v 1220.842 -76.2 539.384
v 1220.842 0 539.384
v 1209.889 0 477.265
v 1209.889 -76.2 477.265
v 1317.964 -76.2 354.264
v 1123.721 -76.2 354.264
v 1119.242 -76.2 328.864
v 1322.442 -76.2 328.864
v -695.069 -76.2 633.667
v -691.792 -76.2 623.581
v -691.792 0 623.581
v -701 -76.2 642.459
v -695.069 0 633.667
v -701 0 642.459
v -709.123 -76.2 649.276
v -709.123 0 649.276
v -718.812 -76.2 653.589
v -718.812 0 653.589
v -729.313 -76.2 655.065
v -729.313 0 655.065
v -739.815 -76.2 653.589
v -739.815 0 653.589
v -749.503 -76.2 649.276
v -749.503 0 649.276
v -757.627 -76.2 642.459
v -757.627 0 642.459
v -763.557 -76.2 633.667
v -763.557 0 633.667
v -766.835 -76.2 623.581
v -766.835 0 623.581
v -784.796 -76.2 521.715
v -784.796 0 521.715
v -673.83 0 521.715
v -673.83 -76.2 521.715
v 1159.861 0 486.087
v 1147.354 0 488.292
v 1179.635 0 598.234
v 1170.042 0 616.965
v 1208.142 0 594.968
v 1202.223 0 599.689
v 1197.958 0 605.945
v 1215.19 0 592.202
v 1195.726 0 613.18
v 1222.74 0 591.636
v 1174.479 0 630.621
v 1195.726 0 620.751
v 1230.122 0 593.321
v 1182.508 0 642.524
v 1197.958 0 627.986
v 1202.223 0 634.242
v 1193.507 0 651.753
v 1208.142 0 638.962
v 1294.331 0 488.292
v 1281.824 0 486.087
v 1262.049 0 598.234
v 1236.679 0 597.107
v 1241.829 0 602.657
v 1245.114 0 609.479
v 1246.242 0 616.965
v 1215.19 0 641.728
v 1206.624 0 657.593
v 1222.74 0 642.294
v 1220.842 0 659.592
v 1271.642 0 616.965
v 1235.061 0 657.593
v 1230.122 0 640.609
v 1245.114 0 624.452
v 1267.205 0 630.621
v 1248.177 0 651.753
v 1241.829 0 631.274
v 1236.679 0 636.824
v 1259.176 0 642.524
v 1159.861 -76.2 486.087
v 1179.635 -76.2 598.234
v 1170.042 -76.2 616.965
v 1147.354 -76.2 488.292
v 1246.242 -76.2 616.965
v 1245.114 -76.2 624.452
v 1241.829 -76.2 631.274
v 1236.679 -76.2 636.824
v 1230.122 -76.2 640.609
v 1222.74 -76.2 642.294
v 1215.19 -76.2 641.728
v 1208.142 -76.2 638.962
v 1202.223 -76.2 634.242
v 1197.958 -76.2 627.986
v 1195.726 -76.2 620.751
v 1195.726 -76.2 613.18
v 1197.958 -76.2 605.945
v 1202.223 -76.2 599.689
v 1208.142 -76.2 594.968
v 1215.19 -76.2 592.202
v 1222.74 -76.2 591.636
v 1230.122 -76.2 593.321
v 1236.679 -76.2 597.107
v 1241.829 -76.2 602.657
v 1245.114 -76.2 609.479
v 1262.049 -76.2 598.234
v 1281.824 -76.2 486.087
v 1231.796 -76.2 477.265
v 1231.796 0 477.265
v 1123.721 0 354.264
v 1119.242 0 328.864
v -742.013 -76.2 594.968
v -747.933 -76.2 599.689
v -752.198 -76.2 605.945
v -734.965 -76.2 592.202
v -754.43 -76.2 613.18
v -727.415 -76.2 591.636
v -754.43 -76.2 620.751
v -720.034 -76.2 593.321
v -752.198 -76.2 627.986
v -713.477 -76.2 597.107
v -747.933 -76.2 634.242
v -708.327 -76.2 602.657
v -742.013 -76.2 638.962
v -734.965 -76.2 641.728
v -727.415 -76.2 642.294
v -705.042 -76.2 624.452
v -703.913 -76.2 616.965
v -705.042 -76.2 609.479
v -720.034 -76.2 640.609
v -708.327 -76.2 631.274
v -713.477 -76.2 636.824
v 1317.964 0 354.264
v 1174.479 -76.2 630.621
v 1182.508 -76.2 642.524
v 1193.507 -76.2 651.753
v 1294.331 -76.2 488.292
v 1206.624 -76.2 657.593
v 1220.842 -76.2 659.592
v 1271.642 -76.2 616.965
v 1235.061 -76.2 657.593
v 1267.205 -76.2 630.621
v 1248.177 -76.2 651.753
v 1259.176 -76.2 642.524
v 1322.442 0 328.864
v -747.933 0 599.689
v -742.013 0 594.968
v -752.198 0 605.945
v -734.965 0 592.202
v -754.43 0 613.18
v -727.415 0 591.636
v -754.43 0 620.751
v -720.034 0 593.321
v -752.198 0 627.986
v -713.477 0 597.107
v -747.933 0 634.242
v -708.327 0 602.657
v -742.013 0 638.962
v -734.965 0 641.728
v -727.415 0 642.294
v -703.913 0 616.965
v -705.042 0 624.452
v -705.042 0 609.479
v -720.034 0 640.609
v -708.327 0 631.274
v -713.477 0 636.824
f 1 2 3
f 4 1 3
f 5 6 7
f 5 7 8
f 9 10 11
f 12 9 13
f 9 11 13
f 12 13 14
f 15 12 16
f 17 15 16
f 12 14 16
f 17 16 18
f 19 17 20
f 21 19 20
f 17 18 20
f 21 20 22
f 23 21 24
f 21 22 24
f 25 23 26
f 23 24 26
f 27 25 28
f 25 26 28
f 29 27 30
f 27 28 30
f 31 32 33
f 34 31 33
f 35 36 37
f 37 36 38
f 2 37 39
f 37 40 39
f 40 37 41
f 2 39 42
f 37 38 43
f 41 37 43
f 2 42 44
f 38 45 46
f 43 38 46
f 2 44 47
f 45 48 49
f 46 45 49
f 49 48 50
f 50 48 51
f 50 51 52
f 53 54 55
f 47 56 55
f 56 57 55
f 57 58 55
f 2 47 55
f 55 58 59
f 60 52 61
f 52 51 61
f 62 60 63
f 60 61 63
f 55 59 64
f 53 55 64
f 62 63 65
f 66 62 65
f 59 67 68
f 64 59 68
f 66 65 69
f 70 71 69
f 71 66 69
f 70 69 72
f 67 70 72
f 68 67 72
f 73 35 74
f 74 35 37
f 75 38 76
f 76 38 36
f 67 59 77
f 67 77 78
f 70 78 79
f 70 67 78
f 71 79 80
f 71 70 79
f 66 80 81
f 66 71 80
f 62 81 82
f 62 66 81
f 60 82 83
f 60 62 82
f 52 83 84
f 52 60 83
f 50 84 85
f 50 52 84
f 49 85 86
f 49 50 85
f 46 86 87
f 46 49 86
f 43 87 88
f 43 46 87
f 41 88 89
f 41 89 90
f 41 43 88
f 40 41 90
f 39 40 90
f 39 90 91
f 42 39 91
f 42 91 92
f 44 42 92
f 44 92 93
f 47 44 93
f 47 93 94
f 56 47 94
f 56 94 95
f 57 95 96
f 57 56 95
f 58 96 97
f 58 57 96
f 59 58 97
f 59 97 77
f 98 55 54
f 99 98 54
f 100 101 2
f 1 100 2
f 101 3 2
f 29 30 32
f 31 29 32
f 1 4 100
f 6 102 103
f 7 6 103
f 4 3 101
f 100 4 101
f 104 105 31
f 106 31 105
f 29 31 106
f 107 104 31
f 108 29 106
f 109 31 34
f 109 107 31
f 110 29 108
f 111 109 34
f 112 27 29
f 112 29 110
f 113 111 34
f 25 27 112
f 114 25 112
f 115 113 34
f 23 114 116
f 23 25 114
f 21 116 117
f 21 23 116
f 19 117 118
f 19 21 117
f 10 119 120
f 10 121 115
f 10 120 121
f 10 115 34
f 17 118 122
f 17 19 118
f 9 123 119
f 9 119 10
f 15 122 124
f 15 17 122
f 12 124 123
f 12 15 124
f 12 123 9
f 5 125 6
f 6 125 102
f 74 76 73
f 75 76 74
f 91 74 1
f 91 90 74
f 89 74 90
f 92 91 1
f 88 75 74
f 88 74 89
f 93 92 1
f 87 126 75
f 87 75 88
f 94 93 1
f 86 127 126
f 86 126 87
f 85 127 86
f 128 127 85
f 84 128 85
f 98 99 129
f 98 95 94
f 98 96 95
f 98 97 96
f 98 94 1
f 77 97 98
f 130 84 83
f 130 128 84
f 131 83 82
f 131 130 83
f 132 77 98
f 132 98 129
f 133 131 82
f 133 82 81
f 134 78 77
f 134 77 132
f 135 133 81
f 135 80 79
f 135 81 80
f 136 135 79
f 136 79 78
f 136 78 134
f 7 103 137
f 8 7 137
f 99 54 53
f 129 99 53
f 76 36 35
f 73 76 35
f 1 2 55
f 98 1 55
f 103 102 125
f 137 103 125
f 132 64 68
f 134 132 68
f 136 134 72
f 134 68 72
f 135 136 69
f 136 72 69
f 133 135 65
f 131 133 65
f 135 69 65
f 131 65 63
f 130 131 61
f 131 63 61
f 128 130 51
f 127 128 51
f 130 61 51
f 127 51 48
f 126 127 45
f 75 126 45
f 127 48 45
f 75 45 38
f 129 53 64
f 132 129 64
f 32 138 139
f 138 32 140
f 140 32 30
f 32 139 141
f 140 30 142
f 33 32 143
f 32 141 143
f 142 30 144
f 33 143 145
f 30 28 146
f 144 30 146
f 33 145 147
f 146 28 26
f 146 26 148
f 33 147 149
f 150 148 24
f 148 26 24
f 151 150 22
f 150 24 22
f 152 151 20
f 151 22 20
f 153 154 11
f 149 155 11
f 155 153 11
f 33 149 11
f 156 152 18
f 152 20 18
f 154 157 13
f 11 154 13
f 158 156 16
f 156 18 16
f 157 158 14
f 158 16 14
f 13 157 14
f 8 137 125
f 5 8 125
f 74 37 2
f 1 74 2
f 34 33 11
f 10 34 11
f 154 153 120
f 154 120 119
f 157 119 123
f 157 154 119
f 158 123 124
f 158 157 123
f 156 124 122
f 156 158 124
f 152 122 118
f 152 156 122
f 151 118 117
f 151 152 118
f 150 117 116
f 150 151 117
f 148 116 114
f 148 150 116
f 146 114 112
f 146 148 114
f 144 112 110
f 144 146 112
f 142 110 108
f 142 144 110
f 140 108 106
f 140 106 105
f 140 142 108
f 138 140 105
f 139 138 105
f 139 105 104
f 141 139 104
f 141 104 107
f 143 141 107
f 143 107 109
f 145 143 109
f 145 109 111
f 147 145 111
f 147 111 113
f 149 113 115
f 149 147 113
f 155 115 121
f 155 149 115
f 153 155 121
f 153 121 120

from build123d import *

# Parameters (mm, degrees)
F1_R     = 25.4
F2_DEPTH = 76.2


with BuildPart() as f2:
    # F1 (on Front) → F2 (new body)
    with BuildSketch(Plane.XZ):
        with BuildLine():
            ThreePointArc((1182.7422758102, 616.9652833939), (1220.8422758102, 578.8652833939), (1258.9422758102, 616.9652833939))
            ThreePointArc((1258.9422758102, 616.9652833939), (1220.8422758102, 655.0652833939), (1182.7422758102, 616.9652833939))
        make_face()
        with Locations((1220.8422758102, 616.9652833939)):
            Circle(F1_R, mode=Mode.SUBTRACT)
        with BuildLine():
            ThreePointArc((1182.7422758102, 616.9652833939), (1220.8422758102, 655.0652833939), (1258.9422758102, 616.9652833939))
            Line((1258.9422758102, 616.9652833939), (1271.6422758102, 616.9652833939))
            ThreePointArc((1271.6422758102, 616.9652833939), (1220.8422758102, 659.5915446577), (1170.0422758102, 616.9652833939))
            Line((1170.0422758102, 616.9652833939), (1182.7422758102, 616.9652833939))
        make_face()
        with BuildLine():
            Line((1271.6422758102, 616.9652833939), (1258.9422758102, 616.9652833939))
            ThreePointArc((1258.9422758102, 616.9652833939), (1220.8422758102, 578.8652833939), (1182.7422758102, 616.9652833939))
            Line((1182.7422758102, 616.9652833939), (1170.0422758102, 616.9652833939))
            Line((1170.0422758102, 616.9652833939), (1147.3536941437, 488.2919426757))
            Line((1147.3536941437, 488.2919426757), (1159.860752607, 486.0866108193))
            Line((1159.860752607, 486.0866108193), (1179.6353693827, 598.2340354293))
            Line((1179.6353693827, 598.2340354293), (1220.8422758102, 539.3844741508))
            Line((1220.8422758102, 539.3844741508), (1262.0491822378, 598.2340354293))
            Line((1262.0491822378, 598.2340354293), (1281.8237990135, 486.0866108193))
            Line((1281.8237990135, 486.0866108193), (1294.3308574767, 488.2919426757))
            Line((1294.3308574767, 488.2919426757), (1271.6422758102, 616.9652833939))
        make_face()
    extrude(amount=F2_DEPTH)


with BuildPart() as f2b:
    # F1 (on Front) → F2, piece 2 (new body)
    with BuildSketch(Plane.XZ):
        Polygon((1317.9635705002, 354.2641669573), (1305.0676525293, 354.2641669573), (1309.5463578393, 328.8641669573), (1322.4422758102, 328.8641669573), align=None)
        Polygon((1309.5463578393, 328.8641669573), (1305.0676525293, 354.2641669573), (1253.4839806455, 354.2641669573), (1257.9626859555, 328.8641669573), align=None)
        Polygon((1188.200570975, 354.2641669573), (1136.6168990912, 354.2641669573), (1132.1381937812, 328.8641669573), (1183.721865665, 328.8641669573), align=None)
        Polygon((1132.1381937812, 328.8641669573), (1136.6168990912, 354.2641669573), (1123.7209811202, 354.2641669573), (1119.2422758102, 328.8641669573), align=None)
        Polygon((1257.9626859555, 328.8641669573), (1253.4839806455, 354.2641669573), (1188.200570975, 354.2641669573), (1183.721865665, 328.8641669573), align=None)
    extrude(amount=F2_DEPTH)


with BuildPart() as f2c:
    # F1 (on Front) → F2, piece 3 (new body)
    with BuildSketch(Plane.XZ):
        Polygon((1209.88898646, 477.2652833939), (1231.7955651605, 477.2652833939), (1220.8422758102, 539.3844741508), align=None)
    extrude(amount=F2_DEPTH)


with BuildPart() as f2d:
    # F1 (on Front) → F2, piece 4 (new body)
    with BuildSketch(Plane.XZ):
        with BuildLine():
            ThreePointArc((-766.8345454561, 623.581278963), (-732.634003865, 579.0102653966), (-691.2133700663, 616.9652833939))
            ThreePointArc((-691.2133700663, 616.9652833939), (-691.358352069, 620.2859171925), (-691.7921946765, 623.581278963))
            ThreePointArc((-691.7921946765, 623.581278963), (-729.3133700663, 655.0652833939), (-766.8345454561, 623.581278963))
        make_face()
        with Locations((-729.3133700663, 616.9652833939)):
            Circle(F1_R, mode=Mode.SUBTRACT)
        with BuildLine():
            ThreePointArc((-691.7921946765, 623.581278963), (-691.358352069, 620.2859171925), (-691.2133700663, 616.9652833939))
            ThreePointArc((-691.2133700663, 616.9652833939), (-732.634003865, 579.0102653966), (-766.8345454561, 623.581278963))
            Line((-766.8345454561, 623.581278963), (-784.7962688916, 521.7152833939))
            Line((-784.7962688916, 521.7152833939), (-673.830471241, 521.7152833939))
            Line((-673.830471241, 521.7152833939), (-691.7921946765, 623.581278963))
        make_face()
    extrude(amount=F2_DEPTH)


solid = Compound([f2.part, f2b.part, f2c.part, f2d.part])
